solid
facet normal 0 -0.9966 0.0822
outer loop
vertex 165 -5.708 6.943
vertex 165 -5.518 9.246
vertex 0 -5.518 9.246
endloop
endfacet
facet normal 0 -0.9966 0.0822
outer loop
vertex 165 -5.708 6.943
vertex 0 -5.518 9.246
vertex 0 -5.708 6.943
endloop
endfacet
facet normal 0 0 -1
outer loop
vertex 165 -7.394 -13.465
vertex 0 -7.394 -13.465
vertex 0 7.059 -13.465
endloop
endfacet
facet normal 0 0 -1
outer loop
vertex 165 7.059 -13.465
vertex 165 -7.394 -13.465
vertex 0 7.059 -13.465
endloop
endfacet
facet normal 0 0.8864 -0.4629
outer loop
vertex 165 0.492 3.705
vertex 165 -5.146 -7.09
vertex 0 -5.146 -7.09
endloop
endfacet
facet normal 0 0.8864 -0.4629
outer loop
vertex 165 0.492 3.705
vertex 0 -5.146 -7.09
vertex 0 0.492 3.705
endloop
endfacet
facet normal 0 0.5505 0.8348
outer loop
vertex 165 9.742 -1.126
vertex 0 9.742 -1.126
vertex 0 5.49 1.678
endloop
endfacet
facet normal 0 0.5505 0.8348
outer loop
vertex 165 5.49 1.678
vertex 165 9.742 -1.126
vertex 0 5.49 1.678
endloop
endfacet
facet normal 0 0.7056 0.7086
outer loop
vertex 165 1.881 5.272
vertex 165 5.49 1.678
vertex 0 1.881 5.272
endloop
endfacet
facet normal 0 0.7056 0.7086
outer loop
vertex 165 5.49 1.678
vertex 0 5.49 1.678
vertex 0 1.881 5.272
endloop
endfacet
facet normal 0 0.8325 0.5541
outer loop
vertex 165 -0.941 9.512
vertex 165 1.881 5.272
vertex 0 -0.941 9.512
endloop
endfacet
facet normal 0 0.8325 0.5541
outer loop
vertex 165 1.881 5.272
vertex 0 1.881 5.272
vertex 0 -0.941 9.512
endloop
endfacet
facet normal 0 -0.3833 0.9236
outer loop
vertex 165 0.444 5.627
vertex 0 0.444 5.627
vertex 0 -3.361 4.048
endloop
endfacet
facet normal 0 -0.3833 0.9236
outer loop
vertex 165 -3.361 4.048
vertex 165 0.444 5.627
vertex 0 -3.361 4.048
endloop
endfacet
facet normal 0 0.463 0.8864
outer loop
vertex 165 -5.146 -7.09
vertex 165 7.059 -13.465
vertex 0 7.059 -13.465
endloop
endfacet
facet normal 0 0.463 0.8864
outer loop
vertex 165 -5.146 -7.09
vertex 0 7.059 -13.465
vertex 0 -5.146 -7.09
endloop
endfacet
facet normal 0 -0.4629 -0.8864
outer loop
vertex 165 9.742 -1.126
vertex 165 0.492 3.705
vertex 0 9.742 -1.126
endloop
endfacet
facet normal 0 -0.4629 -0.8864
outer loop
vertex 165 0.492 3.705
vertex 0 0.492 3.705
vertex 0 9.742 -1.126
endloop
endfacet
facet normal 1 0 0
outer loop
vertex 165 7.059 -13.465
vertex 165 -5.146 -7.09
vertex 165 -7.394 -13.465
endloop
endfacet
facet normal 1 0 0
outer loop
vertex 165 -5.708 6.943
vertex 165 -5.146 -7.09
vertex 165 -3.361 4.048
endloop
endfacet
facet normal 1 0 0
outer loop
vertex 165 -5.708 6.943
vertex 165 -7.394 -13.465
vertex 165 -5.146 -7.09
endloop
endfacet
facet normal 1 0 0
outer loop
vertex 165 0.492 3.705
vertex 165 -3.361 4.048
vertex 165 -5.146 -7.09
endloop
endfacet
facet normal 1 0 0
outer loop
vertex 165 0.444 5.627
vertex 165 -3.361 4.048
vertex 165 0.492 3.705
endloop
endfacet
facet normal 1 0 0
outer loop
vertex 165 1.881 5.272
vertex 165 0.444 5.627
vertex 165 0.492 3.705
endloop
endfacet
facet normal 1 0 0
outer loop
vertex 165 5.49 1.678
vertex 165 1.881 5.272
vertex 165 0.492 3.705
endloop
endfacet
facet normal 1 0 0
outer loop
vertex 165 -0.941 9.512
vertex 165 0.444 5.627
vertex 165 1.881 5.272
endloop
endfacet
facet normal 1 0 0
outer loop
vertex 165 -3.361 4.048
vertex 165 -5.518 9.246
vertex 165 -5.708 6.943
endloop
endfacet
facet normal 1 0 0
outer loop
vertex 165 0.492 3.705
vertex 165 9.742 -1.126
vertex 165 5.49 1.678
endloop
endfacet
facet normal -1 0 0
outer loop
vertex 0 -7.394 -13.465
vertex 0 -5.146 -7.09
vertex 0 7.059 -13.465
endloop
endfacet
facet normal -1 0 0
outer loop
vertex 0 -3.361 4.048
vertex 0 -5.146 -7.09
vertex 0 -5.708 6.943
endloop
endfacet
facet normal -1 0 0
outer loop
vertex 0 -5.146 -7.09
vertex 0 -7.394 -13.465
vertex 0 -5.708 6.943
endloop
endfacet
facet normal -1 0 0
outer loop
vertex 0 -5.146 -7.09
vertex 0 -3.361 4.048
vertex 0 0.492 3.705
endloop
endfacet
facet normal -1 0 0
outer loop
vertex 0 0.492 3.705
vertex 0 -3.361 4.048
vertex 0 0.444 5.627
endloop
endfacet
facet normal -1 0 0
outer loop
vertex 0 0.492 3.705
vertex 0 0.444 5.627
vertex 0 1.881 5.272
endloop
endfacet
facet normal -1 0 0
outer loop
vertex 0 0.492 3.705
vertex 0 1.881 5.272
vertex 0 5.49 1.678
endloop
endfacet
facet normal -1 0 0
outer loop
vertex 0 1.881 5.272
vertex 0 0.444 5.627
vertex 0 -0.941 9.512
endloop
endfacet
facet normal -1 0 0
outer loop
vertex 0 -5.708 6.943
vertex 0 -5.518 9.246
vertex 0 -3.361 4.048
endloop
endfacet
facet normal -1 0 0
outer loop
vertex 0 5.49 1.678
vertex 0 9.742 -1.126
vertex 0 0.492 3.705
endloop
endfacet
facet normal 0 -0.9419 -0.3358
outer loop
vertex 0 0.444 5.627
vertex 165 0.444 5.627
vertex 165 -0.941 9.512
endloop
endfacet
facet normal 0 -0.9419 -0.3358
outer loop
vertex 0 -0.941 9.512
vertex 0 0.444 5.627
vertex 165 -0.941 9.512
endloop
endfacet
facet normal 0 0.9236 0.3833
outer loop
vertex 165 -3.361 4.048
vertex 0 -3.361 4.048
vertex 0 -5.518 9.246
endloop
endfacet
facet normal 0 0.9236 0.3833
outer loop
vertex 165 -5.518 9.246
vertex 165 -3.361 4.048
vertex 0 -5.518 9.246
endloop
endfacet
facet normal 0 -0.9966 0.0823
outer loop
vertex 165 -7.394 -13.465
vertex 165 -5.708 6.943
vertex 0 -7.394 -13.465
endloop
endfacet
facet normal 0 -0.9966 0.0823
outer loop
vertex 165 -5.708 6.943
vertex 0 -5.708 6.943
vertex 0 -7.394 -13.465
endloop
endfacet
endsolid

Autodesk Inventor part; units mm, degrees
ref_plane "YZ Plane" through (0, 0, 0) normal (1, 0, 0) x (0, 1, 0)
ref_plane "XZ Plane" through (0, 0, 0) normal (0, 1, 0) x (-1, 0, 0)
ref_plane "XY Plane" through (0, 0, 0) normal (0, 0, 1) x (1, 0, 0)
sketch "Esboço1" plane through (0, 0, 0) normal (1, 0, 0) x (0, 1, 0)
  line L0 (0.4443, 5.6274) -> (-0.9413, 9.5119)
  line L1 (0.4443, 5.6274) -> (-3.3612, 4.0485)
  line L2 (-3.3612, 4.0485) -> (-5.5175, 9.2458)
  line L3 (-5.5175, 9.2458) -> (-5.7078, 6.9431)
  line L4 (-7.3945, -13.4652) -> (7.0591, -13.4652)
  line L5 (7.0591, -13.4652) -> (-5.1461, -7.0903)
  line L6 (-5.1461, -7.0903) -> (0.4923, 3.7048)
  line L7 (0.4923, 3.7048) -> (9.7416, -1.1262)
  arc A0 (-0.9413, 9.5119) -> (9.7416, -1.1262) centre (21.579, 21.4439) ccw
  line L8 (-5.7078, 6.9431) -> (-7.3945, -13.4652)
  point P0 (-0.6447, 8.6807)
extrude "Extrusão1" add sketch "Esboço1" along normal blind 165
properties part number "juncao controle tela"
